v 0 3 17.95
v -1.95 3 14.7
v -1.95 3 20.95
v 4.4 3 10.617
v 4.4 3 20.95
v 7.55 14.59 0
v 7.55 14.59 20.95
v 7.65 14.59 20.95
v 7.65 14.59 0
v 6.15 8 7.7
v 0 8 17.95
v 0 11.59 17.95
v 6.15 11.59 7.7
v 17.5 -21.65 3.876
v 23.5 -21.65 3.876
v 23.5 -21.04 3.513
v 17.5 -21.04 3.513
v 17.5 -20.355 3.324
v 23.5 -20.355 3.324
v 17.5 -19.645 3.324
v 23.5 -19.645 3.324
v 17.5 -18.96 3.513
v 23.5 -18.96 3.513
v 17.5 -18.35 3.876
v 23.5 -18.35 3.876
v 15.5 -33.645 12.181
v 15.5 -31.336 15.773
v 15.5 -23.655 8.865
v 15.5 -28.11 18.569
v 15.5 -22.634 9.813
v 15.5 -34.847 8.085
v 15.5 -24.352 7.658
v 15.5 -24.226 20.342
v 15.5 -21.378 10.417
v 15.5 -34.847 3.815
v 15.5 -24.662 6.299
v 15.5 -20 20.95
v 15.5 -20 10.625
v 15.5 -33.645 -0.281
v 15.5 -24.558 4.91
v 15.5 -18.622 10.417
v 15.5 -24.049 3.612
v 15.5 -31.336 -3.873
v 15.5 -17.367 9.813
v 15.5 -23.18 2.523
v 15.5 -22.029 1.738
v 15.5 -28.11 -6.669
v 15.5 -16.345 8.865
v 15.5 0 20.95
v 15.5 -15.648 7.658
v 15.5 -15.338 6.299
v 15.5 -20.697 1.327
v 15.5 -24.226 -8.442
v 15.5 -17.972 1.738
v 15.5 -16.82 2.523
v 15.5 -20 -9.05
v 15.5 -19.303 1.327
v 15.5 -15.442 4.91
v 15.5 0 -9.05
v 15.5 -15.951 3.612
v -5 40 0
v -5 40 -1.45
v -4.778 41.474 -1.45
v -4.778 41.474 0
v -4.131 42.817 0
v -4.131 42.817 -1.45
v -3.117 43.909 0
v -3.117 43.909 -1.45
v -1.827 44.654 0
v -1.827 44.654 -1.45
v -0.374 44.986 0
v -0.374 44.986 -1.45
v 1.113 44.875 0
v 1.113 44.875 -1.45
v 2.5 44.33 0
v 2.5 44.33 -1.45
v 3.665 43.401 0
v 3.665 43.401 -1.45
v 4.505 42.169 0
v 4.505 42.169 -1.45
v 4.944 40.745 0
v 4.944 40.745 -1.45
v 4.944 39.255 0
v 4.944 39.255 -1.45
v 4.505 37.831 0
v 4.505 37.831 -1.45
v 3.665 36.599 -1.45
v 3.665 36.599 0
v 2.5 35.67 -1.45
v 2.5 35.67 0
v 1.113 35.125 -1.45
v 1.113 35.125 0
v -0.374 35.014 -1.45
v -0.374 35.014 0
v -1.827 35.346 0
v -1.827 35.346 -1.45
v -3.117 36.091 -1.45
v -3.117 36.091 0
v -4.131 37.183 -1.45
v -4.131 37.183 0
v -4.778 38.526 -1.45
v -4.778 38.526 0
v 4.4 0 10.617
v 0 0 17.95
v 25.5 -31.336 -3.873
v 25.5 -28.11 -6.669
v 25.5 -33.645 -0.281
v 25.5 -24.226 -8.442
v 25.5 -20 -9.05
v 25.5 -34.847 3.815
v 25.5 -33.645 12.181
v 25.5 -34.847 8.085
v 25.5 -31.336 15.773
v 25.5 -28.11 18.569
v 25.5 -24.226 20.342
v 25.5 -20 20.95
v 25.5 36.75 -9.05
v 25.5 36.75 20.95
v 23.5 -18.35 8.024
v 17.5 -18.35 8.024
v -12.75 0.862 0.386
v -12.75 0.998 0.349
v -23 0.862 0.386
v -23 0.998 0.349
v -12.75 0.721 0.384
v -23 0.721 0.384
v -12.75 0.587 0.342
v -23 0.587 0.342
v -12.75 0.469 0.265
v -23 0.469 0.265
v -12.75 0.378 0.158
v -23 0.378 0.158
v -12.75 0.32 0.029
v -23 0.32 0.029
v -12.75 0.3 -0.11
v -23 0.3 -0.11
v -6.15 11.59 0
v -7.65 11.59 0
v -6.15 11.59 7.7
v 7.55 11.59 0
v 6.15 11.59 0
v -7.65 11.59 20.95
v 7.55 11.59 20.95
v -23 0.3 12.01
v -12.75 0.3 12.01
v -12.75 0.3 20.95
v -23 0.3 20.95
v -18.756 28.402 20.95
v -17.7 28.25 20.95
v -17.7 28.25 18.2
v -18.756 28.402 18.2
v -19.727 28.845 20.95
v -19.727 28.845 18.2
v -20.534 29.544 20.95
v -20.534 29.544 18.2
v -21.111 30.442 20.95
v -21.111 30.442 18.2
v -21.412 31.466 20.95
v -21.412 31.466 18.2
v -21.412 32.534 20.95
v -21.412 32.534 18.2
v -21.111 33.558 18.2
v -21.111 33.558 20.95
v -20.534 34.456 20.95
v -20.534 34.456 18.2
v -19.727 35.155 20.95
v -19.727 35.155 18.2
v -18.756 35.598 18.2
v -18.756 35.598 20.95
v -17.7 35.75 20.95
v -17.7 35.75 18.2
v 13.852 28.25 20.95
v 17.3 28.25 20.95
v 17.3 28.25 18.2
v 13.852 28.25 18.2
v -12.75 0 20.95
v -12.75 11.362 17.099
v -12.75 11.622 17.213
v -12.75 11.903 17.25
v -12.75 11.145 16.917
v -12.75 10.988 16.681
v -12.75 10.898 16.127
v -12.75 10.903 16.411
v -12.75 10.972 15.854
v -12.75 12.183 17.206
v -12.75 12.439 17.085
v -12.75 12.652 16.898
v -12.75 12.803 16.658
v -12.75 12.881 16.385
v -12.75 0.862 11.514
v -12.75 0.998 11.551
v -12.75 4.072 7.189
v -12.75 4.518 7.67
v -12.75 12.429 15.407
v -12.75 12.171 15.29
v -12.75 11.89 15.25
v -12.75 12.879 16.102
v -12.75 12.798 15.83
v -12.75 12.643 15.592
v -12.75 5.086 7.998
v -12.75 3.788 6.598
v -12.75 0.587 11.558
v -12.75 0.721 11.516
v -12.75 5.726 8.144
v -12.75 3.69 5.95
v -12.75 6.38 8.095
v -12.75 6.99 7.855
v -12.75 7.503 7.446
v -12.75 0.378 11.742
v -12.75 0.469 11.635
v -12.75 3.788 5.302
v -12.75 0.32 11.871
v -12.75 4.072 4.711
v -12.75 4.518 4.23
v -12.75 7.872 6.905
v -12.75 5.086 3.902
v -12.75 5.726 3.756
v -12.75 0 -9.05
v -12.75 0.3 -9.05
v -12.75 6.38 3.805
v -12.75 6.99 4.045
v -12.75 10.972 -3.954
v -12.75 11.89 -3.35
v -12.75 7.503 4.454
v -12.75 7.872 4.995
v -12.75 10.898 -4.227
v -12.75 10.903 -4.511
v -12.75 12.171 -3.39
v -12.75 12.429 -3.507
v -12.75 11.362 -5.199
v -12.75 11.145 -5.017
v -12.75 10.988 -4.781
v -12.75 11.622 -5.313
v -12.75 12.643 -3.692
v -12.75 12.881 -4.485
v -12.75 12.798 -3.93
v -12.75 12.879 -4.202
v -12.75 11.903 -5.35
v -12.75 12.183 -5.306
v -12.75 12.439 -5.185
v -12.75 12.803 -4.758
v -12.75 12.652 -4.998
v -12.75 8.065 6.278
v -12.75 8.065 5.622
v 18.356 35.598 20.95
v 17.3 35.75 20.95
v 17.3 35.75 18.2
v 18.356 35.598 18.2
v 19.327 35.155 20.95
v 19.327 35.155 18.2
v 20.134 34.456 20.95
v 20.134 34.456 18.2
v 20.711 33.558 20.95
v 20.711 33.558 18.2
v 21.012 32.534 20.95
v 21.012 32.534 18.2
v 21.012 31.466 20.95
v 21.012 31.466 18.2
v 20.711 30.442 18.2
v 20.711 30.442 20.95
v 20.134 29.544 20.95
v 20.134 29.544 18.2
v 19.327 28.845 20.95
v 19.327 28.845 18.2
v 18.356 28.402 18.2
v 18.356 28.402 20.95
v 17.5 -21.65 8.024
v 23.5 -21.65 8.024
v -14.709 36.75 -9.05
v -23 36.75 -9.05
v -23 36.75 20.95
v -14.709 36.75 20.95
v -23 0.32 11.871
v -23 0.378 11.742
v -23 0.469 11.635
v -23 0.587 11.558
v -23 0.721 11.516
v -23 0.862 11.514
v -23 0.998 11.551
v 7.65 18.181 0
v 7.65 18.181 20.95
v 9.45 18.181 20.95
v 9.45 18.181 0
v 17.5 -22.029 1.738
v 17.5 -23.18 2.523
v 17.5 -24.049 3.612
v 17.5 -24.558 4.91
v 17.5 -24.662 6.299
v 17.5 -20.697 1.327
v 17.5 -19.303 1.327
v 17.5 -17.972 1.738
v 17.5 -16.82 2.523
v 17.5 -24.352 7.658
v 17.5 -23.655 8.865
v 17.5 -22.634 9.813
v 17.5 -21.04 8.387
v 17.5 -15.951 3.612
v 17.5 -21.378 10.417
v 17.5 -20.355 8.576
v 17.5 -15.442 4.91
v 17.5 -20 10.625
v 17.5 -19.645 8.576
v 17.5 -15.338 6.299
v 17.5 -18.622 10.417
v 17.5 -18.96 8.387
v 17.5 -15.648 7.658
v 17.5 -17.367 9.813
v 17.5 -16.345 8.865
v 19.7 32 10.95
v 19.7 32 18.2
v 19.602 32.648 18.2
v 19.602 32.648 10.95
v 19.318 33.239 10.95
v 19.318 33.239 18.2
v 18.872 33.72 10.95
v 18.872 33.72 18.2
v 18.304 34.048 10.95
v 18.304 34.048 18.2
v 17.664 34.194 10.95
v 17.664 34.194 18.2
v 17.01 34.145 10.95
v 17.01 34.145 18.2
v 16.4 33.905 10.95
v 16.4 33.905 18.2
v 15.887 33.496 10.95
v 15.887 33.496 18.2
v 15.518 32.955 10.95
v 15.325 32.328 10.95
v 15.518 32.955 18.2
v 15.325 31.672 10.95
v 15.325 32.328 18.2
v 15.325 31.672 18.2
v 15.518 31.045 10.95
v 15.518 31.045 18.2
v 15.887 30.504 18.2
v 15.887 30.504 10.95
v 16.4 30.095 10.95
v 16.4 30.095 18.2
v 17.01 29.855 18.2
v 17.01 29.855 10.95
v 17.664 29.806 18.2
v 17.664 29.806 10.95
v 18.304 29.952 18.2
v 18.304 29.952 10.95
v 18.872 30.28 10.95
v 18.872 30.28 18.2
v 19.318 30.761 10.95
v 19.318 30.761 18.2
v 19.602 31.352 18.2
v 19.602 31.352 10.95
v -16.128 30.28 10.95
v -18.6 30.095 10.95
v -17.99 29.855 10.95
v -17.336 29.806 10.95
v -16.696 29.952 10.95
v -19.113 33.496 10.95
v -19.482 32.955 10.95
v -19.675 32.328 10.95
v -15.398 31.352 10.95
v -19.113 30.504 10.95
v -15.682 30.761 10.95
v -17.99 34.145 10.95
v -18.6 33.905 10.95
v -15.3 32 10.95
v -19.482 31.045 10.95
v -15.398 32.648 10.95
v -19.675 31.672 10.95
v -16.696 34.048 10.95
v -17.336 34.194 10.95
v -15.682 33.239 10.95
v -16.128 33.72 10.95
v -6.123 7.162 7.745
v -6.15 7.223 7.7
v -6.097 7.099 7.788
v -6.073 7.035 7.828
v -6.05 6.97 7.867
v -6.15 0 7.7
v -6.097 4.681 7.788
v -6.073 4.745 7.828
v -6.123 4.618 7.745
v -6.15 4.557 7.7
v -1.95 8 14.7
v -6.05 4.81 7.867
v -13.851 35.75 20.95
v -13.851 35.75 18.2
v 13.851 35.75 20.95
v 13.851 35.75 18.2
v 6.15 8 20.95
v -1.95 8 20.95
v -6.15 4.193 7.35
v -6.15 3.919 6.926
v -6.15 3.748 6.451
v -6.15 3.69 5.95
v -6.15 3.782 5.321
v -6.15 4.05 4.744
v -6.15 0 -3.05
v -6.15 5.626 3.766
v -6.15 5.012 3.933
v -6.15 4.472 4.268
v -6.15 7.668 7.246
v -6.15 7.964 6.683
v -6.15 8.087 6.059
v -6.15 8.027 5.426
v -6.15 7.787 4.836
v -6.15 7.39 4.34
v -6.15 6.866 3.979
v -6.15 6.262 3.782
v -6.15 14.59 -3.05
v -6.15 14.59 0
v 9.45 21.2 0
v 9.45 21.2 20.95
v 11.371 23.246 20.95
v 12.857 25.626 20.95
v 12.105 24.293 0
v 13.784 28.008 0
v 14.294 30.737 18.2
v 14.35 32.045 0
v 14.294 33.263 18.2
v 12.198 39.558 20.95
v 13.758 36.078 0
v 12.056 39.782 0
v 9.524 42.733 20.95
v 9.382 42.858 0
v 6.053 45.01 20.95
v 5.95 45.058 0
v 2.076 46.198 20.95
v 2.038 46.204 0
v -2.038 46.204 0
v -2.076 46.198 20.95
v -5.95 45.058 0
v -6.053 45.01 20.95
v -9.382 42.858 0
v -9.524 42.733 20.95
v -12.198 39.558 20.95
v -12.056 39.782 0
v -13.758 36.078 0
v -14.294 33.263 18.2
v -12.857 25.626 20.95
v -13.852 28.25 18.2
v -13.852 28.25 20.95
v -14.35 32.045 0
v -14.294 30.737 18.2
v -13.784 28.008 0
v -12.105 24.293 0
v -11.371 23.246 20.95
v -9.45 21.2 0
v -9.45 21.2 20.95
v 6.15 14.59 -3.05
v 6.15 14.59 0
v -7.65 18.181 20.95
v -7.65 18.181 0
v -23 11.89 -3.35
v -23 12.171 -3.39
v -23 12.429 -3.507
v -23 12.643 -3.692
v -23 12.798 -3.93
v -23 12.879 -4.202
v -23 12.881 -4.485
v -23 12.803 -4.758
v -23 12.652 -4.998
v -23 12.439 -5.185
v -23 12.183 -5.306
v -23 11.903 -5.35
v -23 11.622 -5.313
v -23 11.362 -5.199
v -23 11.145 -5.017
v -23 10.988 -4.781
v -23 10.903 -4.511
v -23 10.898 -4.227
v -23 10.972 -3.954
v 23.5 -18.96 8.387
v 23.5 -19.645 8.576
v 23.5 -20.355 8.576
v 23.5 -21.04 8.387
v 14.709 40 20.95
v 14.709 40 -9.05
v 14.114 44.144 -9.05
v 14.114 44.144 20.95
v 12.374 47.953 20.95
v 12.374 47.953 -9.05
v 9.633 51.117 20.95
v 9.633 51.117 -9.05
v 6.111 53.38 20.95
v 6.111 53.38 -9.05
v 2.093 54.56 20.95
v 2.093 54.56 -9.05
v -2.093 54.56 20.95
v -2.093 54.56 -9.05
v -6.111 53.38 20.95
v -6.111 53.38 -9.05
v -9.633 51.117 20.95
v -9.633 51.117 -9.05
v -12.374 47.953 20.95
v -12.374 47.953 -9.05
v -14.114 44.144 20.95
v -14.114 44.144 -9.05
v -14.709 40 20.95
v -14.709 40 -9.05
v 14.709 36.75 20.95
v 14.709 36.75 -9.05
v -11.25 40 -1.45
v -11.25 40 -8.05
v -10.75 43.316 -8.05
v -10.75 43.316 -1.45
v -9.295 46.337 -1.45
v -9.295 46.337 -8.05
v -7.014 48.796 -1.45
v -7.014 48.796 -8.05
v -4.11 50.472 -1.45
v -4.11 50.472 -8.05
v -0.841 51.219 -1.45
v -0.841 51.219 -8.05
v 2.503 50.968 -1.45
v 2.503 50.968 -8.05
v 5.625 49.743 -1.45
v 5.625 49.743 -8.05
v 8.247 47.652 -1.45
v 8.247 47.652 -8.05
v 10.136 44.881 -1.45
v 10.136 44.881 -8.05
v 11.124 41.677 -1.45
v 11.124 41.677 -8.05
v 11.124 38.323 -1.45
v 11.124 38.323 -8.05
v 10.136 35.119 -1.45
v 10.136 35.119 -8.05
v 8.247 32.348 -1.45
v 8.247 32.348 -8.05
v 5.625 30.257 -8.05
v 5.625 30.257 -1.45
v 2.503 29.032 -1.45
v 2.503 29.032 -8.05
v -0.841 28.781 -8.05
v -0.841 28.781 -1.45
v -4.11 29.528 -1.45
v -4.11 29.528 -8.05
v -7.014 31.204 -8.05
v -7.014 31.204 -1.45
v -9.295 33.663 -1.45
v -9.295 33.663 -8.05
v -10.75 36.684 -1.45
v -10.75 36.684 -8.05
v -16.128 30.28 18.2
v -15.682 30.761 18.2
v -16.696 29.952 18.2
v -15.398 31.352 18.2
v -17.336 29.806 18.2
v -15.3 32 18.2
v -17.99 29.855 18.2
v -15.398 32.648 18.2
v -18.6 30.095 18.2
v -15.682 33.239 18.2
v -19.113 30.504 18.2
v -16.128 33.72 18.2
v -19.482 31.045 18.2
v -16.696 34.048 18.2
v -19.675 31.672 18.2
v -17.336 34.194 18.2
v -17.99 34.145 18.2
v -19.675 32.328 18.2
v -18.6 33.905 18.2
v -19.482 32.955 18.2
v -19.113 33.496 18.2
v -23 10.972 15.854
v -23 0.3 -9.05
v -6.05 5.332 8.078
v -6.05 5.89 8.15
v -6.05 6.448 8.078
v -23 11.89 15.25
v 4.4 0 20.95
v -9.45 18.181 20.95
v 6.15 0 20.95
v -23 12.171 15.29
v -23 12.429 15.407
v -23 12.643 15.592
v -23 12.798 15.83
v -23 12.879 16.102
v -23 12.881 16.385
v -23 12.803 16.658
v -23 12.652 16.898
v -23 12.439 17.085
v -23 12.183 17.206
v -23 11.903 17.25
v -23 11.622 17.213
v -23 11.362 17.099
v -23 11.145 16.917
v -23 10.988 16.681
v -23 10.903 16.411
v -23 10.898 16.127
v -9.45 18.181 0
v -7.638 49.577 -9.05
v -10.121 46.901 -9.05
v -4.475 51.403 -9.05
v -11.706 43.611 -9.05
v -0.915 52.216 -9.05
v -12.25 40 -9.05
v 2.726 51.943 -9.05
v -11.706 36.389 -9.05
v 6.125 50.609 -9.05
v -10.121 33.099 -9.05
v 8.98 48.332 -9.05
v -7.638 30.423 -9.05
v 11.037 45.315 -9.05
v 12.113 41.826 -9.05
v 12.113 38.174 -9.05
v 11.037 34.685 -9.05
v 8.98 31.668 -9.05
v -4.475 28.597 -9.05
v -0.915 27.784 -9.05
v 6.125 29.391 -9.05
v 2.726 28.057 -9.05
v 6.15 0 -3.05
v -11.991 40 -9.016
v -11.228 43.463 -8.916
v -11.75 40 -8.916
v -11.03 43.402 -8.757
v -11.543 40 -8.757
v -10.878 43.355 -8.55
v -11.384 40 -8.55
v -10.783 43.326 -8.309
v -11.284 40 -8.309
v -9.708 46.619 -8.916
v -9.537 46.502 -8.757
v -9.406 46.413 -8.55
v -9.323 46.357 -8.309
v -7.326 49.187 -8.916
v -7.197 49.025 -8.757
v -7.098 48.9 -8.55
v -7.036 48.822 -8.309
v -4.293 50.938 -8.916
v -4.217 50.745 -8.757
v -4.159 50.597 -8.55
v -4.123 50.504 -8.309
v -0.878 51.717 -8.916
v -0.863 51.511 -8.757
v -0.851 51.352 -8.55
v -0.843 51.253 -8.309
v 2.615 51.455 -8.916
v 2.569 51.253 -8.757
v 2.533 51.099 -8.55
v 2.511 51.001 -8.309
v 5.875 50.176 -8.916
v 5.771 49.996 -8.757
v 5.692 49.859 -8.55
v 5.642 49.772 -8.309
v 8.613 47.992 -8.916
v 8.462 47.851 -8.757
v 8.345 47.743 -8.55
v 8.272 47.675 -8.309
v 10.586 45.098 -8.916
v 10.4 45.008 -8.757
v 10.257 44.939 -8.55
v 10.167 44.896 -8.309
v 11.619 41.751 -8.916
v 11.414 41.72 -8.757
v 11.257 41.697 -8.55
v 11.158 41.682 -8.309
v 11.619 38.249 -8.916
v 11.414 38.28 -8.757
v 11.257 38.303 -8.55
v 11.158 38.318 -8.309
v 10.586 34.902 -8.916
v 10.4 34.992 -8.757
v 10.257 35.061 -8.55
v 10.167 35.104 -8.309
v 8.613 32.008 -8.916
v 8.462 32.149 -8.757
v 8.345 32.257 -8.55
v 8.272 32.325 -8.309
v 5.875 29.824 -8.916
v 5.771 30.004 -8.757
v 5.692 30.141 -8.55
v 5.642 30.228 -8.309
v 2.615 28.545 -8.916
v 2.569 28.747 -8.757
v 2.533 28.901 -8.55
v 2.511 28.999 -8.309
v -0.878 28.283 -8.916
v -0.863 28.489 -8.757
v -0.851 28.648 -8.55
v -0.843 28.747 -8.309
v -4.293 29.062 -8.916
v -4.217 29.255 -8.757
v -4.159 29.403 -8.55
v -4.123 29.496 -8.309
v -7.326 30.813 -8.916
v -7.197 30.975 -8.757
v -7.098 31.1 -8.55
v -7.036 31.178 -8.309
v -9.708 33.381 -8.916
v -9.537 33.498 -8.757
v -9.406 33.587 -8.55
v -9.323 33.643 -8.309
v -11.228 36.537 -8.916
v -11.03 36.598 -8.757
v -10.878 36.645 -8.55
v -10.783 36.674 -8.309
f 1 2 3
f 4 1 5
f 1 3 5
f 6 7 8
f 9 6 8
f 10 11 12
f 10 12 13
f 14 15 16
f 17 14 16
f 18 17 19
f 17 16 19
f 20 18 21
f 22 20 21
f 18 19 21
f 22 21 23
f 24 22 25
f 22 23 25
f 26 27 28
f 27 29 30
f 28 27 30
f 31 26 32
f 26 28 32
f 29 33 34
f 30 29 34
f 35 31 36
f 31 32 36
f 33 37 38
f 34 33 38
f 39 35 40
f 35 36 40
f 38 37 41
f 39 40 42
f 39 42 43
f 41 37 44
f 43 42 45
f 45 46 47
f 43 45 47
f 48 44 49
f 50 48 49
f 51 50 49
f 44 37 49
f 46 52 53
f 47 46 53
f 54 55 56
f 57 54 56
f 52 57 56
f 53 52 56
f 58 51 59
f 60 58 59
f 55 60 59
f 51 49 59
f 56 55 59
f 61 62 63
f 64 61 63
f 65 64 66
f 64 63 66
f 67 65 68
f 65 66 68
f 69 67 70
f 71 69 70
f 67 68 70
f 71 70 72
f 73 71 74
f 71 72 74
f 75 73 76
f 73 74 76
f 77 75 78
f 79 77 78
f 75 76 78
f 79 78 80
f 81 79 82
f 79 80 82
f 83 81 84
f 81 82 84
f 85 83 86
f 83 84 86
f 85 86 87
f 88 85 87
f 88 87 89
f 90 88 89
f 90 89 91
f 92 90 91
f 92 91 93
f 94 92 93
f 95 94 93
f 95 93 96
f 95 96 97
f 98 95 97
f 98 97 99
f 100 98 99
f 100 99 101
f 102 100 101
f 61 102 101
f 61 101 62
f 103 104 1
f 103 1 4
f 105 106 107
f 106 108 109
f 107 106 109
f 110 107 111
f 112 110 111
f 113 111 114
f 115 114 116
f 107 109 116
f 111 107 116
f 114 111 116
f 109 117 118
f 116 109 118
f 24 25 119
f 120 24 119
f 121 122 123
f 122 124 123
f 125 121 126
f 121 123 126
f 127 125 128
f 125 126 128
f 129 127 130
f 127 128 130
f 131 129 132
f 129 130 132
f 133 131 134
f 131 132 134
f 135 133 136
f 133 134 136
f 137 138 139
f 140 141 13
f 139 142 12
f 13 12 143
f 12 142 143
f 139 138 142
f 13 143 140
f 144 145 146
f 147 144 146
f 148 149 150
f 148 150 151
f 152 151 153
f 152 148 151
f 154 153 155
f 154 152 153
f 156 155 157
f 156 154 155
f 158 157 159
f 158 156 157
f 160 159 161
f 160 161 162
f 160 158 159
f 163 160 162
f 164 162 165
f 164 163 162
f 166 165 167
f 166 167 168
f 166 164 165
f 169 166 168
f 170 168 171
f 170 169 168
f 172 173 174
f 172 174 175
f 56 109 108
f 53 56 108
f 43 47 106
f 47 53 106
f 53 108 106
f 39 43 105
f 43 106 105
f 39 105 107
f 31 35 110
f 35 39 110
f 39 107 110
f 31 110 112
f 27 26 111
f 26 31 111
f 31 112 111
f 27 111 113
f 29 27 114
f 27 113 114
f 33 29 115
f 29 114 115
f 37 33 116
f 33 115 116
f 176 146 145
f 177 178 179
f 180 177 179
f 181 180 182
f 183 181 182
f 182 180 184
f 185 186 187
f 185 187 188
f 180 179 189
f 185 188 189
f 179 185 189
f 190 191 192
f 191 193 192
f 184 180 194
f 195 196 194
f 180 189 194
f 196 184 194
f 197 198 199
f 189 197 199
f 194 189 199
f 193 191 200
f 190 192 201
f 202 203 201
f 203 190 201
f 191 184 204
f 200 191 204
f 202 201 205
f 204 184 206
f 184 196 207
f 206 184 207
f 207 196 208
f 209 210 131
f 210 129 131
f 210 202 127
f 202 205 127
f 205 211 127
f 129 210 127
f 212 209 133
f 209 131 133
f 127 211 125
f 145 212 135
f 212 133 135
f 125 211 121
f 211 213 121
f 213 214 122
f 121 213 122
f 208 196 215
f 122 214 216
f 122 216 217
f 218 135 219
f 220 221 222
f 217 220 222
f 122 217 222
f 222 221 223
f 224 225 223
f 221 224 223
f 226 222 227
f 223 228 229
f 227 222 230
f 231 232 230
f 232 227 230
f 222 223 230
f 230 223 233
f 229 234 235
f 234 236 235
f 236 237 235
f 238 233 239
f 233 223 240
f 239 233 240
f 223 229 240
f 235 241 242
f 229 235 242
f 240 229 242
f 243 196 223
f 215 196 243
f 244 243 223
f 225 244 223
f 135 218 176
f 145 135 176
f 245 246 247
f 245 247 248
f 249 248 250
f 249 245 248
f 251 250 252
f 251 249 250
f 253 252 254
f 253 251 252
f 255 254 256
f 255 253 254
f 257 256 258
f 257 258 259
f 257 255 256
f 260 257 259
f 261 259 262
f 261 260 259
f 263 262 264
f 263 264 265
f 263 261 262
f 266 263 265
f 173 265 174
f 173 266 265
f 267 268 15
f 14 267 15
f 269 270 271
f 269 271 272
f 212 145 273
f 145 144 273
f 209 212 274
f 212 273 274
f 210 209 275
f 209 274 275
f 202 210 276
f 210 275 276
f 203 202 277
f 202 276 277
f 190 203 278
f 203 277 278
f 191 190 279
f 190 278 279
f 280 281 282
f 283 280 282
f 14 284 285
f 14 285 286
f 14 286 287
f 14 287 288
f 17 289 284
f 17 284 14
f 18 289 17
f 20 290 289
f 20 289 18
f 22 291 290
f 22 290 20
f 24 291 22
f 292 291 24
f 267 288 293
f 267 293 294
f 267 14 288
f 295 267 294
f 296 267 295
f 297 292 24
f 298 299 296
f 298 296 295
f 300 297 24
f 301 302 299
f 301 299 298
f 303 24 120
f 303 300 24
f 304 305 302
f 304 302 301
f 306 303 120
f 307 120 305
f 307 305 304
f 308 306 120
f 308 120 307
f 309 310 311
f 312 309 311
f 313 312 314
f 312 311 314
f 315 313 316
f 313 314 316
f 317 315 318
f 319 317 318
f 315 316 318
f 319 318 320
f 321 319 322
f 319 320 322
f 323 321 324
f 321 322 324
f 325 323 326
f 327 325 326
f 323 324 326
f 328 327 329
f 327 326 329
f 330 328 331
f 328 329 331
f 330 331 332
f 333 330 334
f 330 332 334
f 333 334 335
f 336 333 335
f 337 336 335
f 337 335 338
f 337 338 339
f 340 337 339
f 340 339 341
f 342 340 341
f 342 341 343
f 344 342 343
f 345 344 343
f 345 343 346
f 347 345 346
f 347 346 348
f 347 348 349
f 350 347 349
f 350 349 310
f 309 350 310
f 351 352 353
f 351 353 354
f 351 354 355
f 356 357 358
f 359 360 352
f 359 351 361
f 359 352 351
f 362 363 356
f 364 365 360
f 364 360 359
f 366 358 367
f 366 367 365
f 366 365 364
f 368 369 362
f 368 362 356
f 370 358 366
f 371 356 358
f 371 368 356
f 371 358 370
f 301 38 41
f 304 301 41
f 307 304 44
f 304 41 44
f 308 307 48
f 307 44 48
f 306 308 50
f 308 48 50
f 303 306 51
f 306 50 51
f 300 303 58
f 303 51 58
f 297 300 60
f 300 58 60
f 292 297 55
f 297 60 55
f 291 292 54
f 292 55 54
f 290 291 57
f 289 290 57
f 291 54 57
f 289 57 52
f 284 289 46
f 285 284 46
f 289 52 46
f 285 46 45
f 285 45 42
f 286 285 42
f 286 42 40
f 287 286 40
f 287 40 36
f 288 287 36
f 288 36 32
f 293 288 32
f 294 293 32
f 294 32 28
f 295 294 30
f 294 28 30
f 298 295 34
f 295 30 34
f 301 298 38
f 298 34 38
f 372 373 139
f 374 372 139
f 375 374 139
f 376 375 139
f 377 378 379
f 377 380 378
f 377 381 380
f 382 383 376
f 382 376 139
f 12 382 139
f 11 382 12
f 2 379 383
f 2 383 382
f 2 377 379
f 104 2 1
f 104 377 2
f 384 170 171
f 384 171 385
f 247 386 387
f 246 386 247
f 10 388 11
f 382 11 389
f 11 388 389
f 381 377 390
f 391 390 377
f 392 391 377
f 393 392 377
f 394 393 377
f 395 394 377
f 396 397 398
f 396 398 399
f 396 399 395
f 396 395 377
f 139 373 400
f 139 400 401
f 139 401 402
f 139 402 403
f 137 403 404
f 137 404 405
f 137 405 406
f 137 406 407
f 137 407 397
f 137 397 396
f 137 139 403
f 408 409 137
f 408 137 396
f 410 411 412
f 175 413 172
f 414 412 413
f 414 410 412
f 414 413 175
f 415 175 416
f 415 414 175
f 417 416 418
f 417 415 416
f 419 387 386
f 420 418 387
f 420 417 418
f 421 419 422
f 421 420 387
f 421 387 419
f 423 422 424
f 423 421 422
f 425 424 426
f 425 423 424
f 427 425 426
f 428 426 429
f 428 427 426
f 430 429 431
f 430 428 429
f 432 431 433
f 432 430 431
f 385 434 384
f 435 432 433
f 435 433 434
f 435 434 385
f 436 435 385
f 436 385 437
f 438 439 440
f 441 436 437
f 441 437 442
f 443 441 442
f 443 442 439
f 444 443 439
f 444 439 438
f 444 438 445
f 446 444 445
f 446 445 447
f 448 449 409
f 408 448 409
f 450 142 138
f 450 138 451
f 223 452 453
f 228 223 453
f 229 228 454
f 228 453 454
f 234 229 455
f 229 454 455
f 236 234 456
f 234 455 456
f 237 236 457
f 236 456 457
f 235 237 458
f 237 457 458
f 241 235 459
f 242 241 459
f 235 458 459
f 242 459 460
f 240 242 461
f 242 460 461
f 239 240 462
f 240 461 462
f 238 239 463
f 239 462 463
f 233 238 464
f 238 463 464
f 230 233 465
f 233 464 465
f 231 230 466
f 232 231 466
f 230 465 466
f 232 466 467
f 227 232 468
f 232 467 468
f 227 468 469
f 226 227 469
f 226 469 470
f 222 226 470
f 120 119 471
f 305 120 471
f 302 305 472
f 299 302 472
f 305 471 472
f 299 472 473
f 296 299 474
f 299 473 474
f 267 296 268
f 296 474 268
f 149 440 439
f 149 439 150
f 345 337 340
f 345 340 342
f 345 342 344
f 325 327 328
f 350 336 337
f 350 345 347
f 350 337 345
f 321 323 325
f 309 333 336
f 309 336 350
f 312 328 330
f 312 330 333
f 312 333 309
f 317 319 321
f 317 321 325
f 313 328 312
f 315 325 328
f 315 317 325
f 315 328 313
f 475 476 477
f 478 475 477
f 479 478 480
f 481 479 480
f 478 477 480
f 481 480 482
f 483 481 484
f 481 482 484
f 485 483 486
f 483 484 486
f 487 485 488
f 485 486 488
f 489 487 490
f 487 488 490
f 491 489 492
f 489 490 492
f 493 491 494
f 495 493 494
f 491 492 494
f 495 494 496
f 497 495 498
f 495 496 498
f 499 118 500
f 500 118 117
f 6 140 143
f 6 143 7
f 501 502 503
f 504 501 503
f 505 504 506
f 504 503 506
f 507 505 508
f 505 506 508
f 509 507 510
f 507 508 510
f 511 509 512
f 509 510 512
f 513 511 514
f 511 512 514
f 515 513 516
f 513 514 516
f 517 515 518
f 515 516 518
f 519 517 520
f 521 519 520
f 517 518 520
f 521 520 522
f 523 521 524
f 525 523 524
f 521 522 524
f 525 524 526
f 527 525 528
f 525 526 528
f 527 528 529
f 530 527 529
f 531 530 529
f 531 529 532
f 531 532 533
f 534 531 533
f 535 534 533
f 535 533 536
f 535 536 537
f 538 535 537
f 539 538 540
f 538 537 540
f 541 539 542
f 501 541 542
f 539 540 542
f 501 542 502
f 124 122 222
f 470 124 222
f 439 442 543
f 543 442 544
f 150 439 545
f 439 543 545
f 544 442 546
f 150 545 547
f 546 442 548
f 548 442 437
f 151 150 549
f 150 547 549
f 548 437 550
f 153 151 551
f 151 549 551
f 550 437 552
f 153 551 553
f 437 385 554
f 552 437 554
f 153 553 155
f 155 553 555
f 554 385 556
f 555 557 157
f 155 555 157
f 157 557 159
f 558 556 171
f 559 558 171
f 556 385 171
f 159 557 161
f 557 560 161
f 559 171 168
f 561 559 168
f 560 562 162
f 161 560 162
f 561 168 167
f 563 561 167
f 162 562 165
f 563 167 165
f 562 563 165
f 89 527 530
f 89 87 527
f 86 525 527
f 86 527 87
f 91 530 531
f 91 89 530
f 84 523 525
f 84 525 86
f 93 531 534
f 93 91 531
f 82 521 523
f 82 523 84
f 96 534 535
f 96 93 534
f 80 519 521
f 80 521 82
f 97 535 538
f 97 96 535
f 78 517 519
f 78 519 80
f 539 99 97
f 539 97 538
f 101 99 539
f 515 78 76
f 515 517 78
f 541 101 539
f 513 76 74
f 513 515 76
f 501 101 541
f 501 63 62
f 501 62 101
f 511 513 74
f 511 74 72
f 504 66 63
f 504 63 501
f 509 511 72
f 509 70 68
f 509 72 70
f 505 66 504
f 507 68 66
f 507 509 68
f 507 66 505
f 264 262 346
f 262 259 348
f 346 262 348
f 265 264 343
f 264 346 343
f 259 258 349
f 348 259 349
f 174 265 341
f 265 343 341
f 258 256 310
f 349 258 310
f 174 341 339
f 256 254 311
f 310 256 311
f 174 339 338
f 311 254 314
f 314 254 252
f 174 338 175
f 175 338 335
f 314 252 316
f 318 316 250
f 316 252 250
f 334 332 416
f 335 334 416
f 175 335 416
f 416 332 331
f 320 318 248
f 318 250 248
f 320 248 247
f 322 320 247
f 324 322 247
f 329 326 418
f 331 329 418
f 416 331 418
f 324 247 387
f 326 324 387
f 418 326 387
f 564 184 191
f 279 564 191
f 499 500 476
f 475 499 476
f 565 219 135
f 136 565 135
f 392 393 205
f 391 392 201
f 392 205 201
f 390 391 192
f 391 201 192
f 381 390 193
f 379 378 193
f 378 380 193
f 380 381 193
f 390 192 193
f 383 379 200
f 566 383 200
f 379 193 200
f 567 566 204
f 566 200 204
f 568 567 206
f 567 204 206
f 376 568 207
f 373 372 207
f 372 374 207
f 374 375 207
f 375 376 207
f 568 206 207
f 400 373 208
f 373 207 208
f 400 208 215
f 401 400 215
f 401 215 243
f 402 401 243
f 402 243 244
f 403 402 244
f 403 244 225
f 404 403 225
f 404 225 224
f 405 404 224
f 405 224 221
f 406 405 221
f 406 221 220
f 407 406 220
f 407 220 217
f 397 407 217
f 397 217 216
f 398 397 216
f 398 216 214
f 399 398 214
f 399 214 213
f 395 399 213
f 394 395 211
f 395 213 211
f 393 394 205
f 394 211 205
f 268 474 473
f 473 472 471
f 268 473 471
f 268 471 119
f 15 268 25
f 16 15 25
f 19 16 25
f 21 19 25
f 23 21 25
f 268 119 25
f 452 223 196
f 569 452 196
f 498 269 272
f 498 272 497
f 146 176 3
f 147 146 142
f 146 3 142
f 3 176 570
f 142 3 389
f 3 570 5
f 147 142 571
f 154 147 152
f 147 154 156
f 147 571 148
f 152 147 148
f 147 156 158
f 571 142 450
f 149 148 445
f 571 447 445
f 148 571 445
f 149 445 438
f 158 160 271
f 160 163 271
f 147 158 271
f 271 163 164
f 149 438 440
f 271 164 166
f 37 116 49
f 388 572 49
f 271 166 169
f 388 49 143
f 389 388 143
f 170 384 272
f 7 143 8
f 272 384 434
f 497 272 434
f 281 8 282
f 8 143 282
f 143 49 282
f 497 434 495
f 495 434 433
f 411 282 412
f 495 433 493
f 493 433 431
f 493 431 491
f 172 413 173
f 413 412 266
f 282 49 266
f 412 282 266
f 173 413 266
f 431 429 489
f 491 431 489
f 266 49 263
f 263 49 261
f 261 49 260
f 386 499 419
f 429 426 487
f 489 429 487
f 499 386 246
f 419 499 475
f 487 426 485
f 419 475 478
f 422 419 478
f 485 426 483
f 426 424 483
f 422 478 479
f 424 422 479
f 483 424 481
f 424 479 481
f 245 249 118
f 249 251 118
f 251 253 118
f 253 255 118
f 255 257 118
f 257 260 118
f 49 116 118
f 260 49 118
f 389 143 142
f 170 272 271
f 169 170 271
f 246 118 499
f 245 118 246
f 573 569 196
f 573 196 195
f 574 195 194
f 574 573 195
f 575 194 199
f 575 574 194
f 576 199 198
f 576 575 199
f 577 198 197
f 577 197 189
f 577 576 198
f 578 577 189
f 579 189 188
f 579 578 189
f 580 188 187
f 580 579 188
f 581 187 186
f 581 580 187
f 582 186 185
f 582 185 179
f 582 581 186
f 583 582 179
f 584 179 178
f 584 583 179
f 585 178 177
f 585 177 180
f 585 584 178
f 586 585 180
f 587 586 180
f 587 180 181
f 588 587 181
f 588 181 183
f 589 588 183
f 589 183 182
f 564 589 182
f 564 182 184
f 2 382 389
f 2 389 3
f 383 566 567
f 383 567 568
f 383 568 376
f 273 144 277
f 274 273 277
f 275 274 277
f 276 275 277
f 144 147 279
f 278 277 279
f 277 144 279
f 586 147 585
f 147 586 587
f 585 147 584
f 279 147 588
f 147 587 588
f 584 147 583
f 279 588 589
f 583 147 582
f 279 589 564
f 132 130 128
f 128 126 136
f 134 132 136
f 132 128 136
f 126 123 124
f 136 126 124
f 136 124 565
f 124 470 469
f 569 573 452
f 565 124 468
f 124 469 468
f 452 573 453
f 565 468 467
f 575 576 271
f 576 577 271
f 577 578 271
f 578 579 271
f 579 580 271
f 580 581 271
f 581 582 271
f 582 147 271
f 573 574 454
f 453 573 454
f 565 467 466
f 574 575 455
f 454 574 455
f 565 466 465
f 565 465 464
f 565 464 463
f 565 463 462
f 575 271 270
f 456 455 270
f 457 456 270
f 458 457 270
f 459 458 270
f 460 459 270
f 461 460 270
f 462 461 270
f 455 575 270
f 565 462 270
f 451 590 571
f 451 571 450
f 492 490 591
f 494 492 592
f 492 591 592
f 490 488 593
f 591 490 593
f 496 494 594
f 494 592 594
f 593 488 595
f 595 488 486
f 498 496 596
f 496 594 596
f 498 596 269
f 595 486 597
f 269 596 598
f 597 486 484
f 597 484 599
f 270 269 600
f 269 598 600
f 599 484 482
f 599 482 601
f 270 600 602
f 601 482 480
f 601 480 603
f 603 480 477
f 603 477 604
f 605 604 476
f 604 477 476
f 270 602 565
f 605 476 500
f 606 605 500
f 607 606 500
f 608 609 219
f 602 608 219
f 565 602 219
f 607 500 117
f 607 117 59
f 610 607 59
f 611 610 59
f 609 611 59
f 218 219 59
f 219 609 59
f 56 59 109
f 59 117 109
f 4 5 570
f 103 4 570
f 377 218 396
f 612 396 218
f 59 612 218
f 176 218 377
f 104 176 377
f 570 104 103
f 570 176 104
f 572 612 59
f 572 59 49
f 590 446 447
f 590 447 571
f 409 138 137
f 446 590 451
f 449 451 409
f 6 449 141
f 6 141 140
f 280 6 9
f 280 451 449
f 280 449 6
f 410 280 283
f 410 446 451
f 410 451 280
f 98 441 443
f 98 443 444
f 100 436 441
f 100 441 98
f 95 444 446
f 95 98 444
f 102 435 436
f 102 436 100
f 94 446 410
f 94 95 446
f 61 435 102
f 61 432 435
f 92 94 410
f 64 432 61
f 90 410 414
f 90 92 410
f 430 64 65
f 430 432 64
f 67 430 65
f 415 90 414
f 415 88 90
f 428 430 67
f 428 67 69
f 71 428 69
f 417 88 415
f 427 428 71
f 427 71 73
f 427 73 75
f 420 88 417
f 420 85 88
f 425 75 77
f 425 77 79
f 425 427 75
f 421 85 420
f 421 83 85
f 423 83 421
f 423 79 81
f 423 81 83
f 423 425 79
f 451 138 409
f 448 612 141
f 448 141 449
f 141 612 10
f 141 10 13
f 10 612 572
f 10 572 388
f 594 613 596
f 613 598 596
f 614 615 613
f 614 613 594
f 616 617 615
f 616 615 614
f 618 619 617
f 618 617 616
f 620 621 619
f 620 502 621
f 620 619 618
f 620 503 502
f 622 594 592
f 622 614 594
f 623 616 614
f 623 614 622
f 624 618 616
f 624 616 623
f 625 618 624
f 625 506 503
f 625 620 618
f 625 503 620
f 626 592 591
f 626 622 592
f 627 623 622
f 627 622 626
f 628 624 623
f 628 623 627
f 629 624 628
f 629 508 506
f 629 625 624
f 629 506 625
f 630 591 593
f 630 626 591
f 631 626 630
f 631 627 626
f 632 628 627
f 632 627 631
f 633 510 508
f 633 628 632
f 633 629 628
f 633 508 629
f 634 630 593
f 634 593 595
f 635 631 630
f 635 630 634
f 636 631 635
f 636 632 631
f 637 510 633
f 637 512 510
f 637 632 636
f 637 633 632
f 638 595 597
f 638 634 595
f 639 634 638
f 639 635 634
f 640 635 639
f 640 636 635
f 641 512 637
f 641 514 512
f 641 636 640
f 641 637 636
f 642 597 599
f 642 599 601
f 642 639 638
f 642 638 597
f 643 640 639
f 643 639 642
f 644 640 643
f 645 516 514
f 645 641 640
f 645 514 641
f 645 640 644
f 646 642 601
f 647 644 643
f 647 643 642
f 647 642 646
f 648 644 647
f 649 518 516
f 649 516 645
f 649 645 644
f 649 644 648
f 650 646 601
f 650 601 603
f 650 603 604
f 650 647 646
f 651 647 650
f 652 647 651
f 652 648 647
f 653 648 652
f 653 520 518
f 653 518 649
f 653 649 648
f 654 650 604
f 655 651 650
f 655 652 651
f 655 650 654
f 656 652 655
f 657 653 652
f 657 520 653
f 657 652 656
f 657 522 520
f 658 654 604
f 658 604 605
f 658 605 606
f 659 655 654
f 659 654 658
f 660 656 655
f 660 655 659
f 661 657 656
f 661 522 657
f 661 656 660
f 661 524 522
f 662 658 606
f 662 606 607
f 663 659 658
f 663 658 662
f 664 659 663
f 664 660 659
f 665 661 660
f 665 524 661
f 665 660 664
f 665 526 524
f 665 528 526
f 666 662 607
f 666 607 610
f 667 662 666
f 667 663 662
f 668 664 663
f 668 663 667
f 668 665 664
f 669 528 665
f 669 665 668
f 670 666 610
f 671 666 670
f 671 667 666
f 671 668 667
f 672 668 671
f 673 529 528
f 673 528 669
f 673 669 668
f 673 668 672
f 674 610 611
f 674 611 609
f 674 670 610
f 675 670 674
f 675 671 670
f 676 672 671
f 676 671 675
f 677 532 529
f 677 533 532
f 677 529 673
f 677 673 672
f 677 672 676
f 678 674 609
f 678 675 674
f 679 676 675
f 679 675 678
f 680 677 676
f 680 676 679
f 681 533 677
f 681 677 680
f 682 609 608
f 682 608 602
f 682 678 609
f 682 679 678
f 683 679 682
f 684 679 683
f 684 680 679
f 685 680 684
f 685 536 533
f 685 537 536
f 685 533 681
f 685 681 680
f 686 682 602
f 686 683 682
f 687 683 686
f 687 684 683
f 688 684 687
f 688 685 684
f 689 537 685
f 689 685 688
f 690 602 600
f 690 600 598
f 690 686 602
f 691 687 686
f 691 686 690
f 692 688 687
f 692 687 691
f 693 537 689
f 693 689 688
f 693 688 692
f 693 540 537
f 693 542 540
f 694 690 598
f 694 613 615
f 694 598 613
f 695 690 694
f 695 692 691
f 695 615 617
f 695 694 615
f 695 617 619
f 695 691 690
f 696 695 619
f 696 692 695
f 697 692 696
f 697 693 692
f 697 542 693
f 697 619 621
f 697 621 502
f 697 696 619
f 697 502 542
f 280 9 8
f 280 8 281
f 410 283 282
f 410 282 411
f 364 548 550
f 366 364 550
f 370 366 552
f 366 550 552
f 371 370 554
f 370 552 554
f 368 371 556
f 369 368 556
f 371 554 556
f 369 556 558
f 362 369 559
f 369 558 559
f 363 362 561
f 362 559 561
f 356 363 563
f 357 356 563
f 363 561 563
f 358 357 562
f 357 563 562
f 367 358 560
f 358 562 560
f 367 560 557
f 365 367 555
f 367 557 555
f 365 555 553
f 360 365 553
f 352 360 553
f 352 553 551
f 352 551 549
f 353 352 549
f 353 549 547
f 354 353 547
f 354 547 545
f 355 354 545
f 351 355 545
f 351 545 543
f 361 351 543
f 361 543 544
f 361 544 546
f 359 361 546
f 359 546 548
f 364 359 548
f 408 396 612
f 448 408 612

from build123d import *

# Parameters (mm, degrees)
BOSS_EXTRUDE1_DEPTH     = 20.95
BOSS_EXTRUDE2_START     = -9.05
BOSS_EXTRUDE2_DEPTH     = 9.05
SKETCH6_R               = 2.2
CUT_EXTRUDE2_DEPTH      = 10
CUT_EXTRUDE3_DEPTH      = 2.75
CUT_EXTRUDE4_DEPTH      = 67.499081444
CUT_EXTRUDE4_DEPTH_BACK = 67.499081444
SKETCH8_W               = 8.290514233
SKETCH8_H               = 3.25
SKETCH11_R              = 11.25
BEARING_HOLE_DEPTH      = 7.6
SKETCH9_W               = 12.3
SKETCH9_H               = 21.5
WIRE_HOLE_DEPTH         = 62.274898109
SKETCH12_W              = 46
SKETCH12_H              = 30
BOSS_EXTRUDE3_DEPTH     = 0.0001
BOSS_EXTRUDE4_DEPTH     = 7.5
BOSS_EXTRUDE5_START     = -7.5
BOSS_EXTRUDE5_DEPTH     = 7.5
BOSS_EXTRUDE9_START     = 2.5
BOSS_EXTRUDE9_DEPTH     = 2.5
SKETCH15_R              = 4
CUT_EXTRUDE5_DEPTH      = 77.054456365
SKETCH17_R              = 6.169612062
SHAT_HOLE_DEPTH         = 10
SKETCH18_R              = 4
BOSS_EXTRUDE7_DEPTH     = 14
SKETCH19_R              = 4.675
CUT_EXTRUDE6_DEPTH      = 2
SKETCH24_R              = 5
CUT_EXTRUDE7_DEPTH      = 65.382744838
FILLET1_R               = 1
SKETCH25_W              = 8.843315878
SKETCH25_H              = 4.834346013
BOSS_EXTRUDE10_DEPTH    = 2
SKETCH27_W              = 12.3
SKETCH27_H              = 21.5
CUT_EXTRUDE8_DEPTH      = 60.56786481
BOSS_EXTRUDE11_DEPTH    = 14.5901
CUT_EXTRUDE9_REACH      = 69.405
SKETCH29_W              = 15.2
SKETCH29_H              = 3
CUT_EXTRUDE14_START     = -10.25
CUT_EXTRUDE14_DEPTH     = 10.25
SKETCH34_R              = 6.901355235
CUT_EXTRUDE15_DEPTH     = 5
FILLET2_R               = 0.5
SKETCH35_R              = 2.2
CUT_EXTRUDE16_DEPTH     = 6.7
CUT_EXTRUDE17_DEPTH     = 10.25
CUT_EXTRUDE18_REACH     = 69.405


with BuildPart() as part:
    # Sketch2 → Boss-Extrude1 (new body)
    with BuildSketch(Plane.XY):
        with BuildLine():
            Line((-14.709485767, 40), (-23, 40))
            Line((-23, 40), (-23, 0))
            Line((-23, 0), (23, 0))
            Line((23, 0), (23, 40))
            Line((23, 40), (14.709485767, 40))
            ThreePointArc((14.709485767, 40), (0, 54.709485767), (-14.709485767, 40))
        make_face()
        with BuildLine():
            Line((-7.65, 18.18111404), (-7.65, 14.59))
            Line((-7.65, 14.59), (7.65, 14.59))
            Line((7.65, 14.59), (7.65, 18.18111404))
            Line((7.65, 18.18111404), (9.45, 18.18111404))
            Line((9.45, 18.18111404), (9.45, 21.20025831))
            ThreePointArc((9.45, 21.20025831), (0, 46.349332344), (-9.45, 21.20025831))
            Line((-9.45, 21.20025831), (-9.45, 18.18111404))
            Line((-9.45, 18.18111404), (-7.65, 18.18111404))
        make_face(mode=Mode.SUBTRACT)
    extrude(amount=BOSS_EXTRUDE1_DEPTH)

    # Sketch3 → Boss-Extrude2 (add)
    with BuildSketch(Plane.XY.offset(BOSS_EXTRUDE2_START)):
        with BuildLine():
            Line((-14.709485767, 40), (-23, 40))
            Line((-23, 40), (-23, 0))
            Line((-23, 0), (23, 0))
            Line((23, 0), (23, 40))
            Line((23, 40), (14.709485767, 40))
            ThreePointArc((14.709485767, 40), (0, 54.709485767), (-14.709485767, 40))
        make_face()
    extrude(amount=BOSS_EXTRUDE2_DEPTH)

    # Sketch6 → Cut-Extrude2 (cut)
    with BuildSketch(Plane.XY.offset(20.95)):
        with Locations((-17.5, 32)):
            Circle(SKETCH6_R)
        with Locations((17.5, 32)):
            Circle(SKETCH6_R)
    extrude(amount=-CUT_EXTRUDE2_DEPTH, mode=Mode.SUBTRACT)

    # Sketch7 → Cut-Extrude3 (cut)
    with BuildSketch(Plane.XY.offset(20.95)):
        with BuildLine():
            Line((-17.7, 35.75), (17.3, 35.75))
            ThreePointArc((17.3, 35.75), (21.05, 32), (17.3, 28.25))
            Line((17.3, 28.25), (-17.7, 28.25))
            ThreePointArc((-17.7, 28.25), (-21.45, 32), (-17.7, 35.75))
        make_face()
    extrude(amount=-CUT_EXTRUDE3_DEPTH, mode=Mode.SUBTRACT)

    # Sketch8 → Cut-Extrude4 (cut, two sides: drawn at the far end of the back side and taken through both)
    with BuildSketch(Plane.XY.offset(20.95).offset(-CUT_EXTRUDE4_DEPTH_BACK)):
        with Locations((-18.854742884, 38.375)):
            Rectangle(SKETCH8_W, SKETCH8_H)
        with Locations((18.854742884, 38.375)):
            Rectangle(SKETCH8_W, SKETCH8_H)
    extrude(amount=CUT_EXTRUDE4_DEPTH + CUT_EXTRUDE4_DEPTH_BACK, mode=Mode.SUBTRACT)

    # Sketch11 → Bearing Hole (cut)
    with BuildSketch(Plane(origin=(0, 0, -9.05), x_dir=(-1, 0, 0), z_dir=(0, 0, -1))):
        with Locations((0, 40)):
            Circle(SKETCH11_R)
    extrude(amount=-BEARING_HOLE_DEPTH, mode=Mode.SUBTRACT)

    # Sketch9 → Wire Hole (cut, through all)
    with BuildSketch(Plane(origin=(0, 14.59, -19.25), x_dir=(-1, 0, 0), z_dir=(0, 1, 0))):
        with Locations((0, 26.95)):
            Rectangle(SKETCH9_W, SKETCH9_H)
    extrude(amount=-WIRE_HOLE_DEPTH, mode=Mode.SUBTRACT)

    # Sketch12 → Boss-Extrude3 (add)
    with BuildSketch(Plane.XZ):
        with Locations((0, 5.95)):
            Rectangle(SKETCH12_W, SKETCH12_H)
    extrude(amount=BOSS_EXTRUDE3_DEPTH)

    # Sketch13 → Boss-Extrude4 (add)
    with BuildSketch(Plane(origin=(23, 0, 0), x_dir=(0, 0, -1), z_dir=(1, 0, 0))):
        with BuildLine():
            Line((-20.95, -0.0001), (-20.95, -20.0001))
            ThreePointArc((-20.95, -20.0001), (-5.95, -35.0001), (9.05, -20.0001))
            Line((9.05, -20.0001), (9.05, -0.0001))
            Line((9.05, -0.0001), (-20.95, -0.0001))
        make_face()
    extrude(amount=-BOSS_EXTRUDE4_DEPTH)

    # Sketch14 → Boss-Extrude5 (add)
    with BuildSketch(Plane.ZY.offset(23).offset(BOSS_EXTRUDE5_START)):
        with BuildLine():
            Line((-9.05, -20.0001), (-9.05, -0.0001))
            Line((-9.05, -0.0001), (20.95, -0.0001))
            Line((20.95, -0.0001), (20.95, -20.0001))
            ThreePointArc((20.95, -20.0001), (5.95, -35.0001), (-9.05, -20.0001))
        make_face()
    extrude(amount=BOSS_EXTRUDE5_DEPTH)

    # Sketch21 → Boss-Extrude9 (add)
    with BuildSketch(Plane(origin=(23, 0, 0), x_dir=(0, 0, -1), z_dir=(1, 0, 0)).offset(BOSS_EXTRUDE9_START)):
        with BuildLine():
            Line((-20.95, -20.0001), (-20.95, 36.75))
            Line((-20.95, 36.75), (9.05, 36.75))
            Line((9.05, 36.75), (9.05, -20.0001))
            ThreePointArc((9.05, -20.0001), (-5.95, -35.0001), (-20.95, -20.0001))
        make_face()
    extrude(amount=-BOSS_EXTRUDE9_DEPTH)

    # Sketch15 → Cut-Extrude5 (cut, through all)
    with BuildSketch(Plane.ZY.offset(23)):
        with Locations(Location((5.95, -20.0001, 0), (0, 0, 270))):
            Circle(SKETCH15_R)
    extrude(amount=-CUT_EXTRUDE5_DEPTH, mode=Mode.SUBTRACT)

    # Sketch17 → Shat hole (add)
    with BuildSketch(Plane(origin=(25.5, 0, -23), x_dir=(0, 0, 1), z_dir=(-1, 0, 0))):
        with Locations((28.95, -20.0001)):
            Circle(SKETCH17_R)
        with BuildLine():
            Line((26.876355865, -18.3501), (31.023644135, -18.3501))
            ThreePointArc((31.023644135, -18.3501), (31.6, -20.0001), (31.023644135, -21.6501))
            Line((31.023644135, -21.6501), (26.876355865, -21.6501))
            ThreePointArc((26.876355865, -21.6501), (26.3, -20.0001), (26.876355865, -18.3501))
        make_face(mode=Mode.SUBTRACT)
    extrude(amount=SHAT_HOLE_DEPTH)

    # Sketch18 → Boss-Extrude7 (add)
    with BuildSketch(Plane.ZY.offset(23)):
        with Locations(Location((5.95, -20.0001, 0), (0, 0, 270))):
            Circle(SKETCH18_R)
    extrude(amount=-BOSS_EXTRUDE7_DEPTH)

    # Sketch19 → Cut-Extrude6 (cut)
    with BuildSketch(Plane.ZY.offset(-15.5)):
        with Locations((5.95, -20.0001)):
            Circle(SKETCH19_R)
    extrude(amount=-CUT_EXTRUDE6_DEPTH, mode=Mode.SUBTRACT)

    # Sketch24 → Cut-Extrude7 (cut, through all)
    with BuildSketch(Plane(origin=(0, 0, -1.45), x_dir=(-1, 0, 0), z_dir=(0, 0, -1))):
        with Locations((0, 40)):
            Circle(SKETCH24_R)
    extrude(amount=-CUT_EXTRUDE7_DEPTH, mode=Mode.SUBTRACT)

    # Fillet1
    fillet1_edges = [part.edges().sort_by_distance(p)[0] for p in [
        (11.25, 40, -9.05),
    ]]
    fillet(fillet1_edges, radius=FILLET1_R)

    # Sketch25 → Boss-Extrude10 (add)
    with BuildSketch(Plane(origin=(25.5, 0, 0), x_dir=(0, 0, -1), z_dir=(1, 0, 0))):
        with Locations((-6.185865257, -20.38943492)):
            Rectangle(SKETCH25_W, SKETCH25_H)
    extrude(amount=-BOSS_EXTRUDE10_DEPTH)

    # Sketch27 → Cut-Extrude8 (cut, through all)
    with BuildSketch(Plane(origin=(0, 14.59, 0), x_dir=(1, 0, 0), z_dir=(0, 1, 0))):
        with Locations((0, -7.7)):
            Rectangle(SKETCH27_W, SKETCH27_H)
    extrude(amount=-CUT_EXTRUDE8_DEPTH, mode=Mode.SUBTRACT)

    # Sketch28 → Boss-Extrude11 (add)
    with BuildSketch(Plane.XZ.offset(0.0001)):
        Polygon((-6.15, 7.7), (0, 17.95), (6.15, 7.7), (6.15, 18.45), (-6.15, 18.45), align=None)
    extrude(amount=-BOSS_EXTRUDE11_DEPTH)

    # Cut-Extrude9: up to this face of the body (flat: up to its plane)
    cut_extrude9_end = Plane(part.part.faces().sort_by_distance((0, 29.436315862, 0))[0])
    # Sketch29 → Cut-Extrude9 (cut, up to the picked face)
    with BuildSketch(Plane.XY.offset(20.95), mode=Mode.PRIVATE) as cut_extrude9_sk1:
        with Locations((-0.05, 13.09)):
            Rectangle(SKETCH29_W, SKETCH29_H)
    cut_extrude9_tool1 = split(extrude(cut_extrude9_sk1.sketch, amount=-CUT_EXTRUDE9_REACH, mode=Mode.PRIVATE), bisect_by=cut_extrude9_end, keep=Keep.BOTH, mode=Mode.PRIVATE)
    add(cut_extrude9_tool1.solids().sort_by(Axis((-0.05, 13.09, 20.95), (0, 0, -1)))[0], mode=Mode.SUBTRACT)

    # Sketch33 → Cut-Extrude14 (cut)
    with BuildSketch(Plane.ZY.offset(23).offset(CUT_EXTRUDE14_START)):
        with BuildLine():
            Line((-4.35, 11.89), (16.25, 11.89))
            Line((16.25, 11.89), (11.25, 0.2999))
            Line((11.25, 0.2999), (20.95, 0.2999))
            Line((20.95, 0.2999), (20.95, -20.0001))
            ThreePointArc((20.95, -20.0001), (5.95, -35.0001), (-9.05, -20.0001))
            Line((-9.05, -20.0001), (-9.05, 0.2999))
            Line((-9.05, 0.2999), (0.65, 0.2999))
            Line((0.65, 0.2999), (-4.35, 11.89))
        make_face()
    extrude(amount=CUT_EXTRUDE14_DEPTH, mode=Mode.SUBTRACT)


with BuildPart() as cut_extrude14_piece_1:
    # of the separate pieces the step leaves, piece 1, a body of its own (cut_extrude14_pieces)
    add(part.part.solids().sort_by_distance((14.709485767, 40, -9.05))[0])

    # Fillet2
    fillet2_edges = [cut_extrude14_piece_1.edges().sort_by_distance(p)[0] for p in [
        (-17.875, 0.2999, 11.25),
        (-17.875, 0.2999, 0.65),
    ]]
    fillet(fillet2_edges, radius=FILLET2_R)

    # Sketch35 → Cut-Extrude16 (cut)
    with BuildSketch(Plane.ZY.offset(12.75)):
        with Locations(Location((5.95, 5.89, 0), (0, 0, 270))):
            Circle(SKETCH35_R)
    extrude(amount=-CUT_EXTRUDE16_DEPTH, mode=Mode.SUBTRACT)

    # Sketch36 → Cut-Extrude17 (cut)
    with BuildSketch(Plane.ZY.offset(23)):
        with BuildLine():
            Line((-3.953885576, 10.971798844), (-4.35, 11.89))
            Line((-4.35, 11.89), (-3.35, 11.89))
            ThreePointArc((-3.35, 11.89), (-5.185498182, 12.43949321), (-3.953885576, 10.971798844))
        make_face()
        with BuildLine():
            Line((15.853885576, 10.971798844), (16.25, 11.89))
            Line((16.25, 11.89), (15.25, 11.89))
            ThreePointArc((15.25, 11.89), (17.085498182, 12.43949321), (15.853885576, 10.971798844))
        make_face()
    extrude(amount=-CUT_EXTRUDE17_DEPTH, mode=Mode.SUBTRACT)

    # Sketch37 → Cut-Extrude18 (cut, up to next)
    with BuildSketch(Plane.XY.offset(20.95), mode=Mode.PRIVATE) as cut_extrude18_sk1:
        Polygon((6.15, -0.0001), (6.15, 7.9999), (-1.95, 7.9999), (-1.95, 2.9999), (4.4, 2.9999), (4.4, -0.0001), align=None)
    cut_extrude18_tool1 = extrude(cut_extrude18_sk1.sketch, amount=-CUT_EXTRUDE18_REACH, mode=Mode.PRIVATE) & cut_extrude14_piece_1.part
    add(cut_extrude18_tool1.solids().sort_by_distance((2.464344, 5.040884, 20.95))[0], mode=Mode.SUBTRACT)


with BuildPart() as cut_extrude14_piece_2:
    # of the separate pieces the step leaves, piece 2, a body of its own (cut_extrude14_pieces)
    add(part.part.solids().sort_by_distance((-12.75, -24.0001, 5.95))[0])

    # Sketch34 → Cut-Extrude15 (cut)
    with BuildSketch(Plane.ZY.offset(12.75)):
        with Locations((5.95, -20.0001)):
            Circle(SKETCH34_R)
    extrude(amount=-CUT_EXTRUDE15_DEPTH, mode=Mode.SUBTRACT)


solid = cut_extrude14_piece_1.part
